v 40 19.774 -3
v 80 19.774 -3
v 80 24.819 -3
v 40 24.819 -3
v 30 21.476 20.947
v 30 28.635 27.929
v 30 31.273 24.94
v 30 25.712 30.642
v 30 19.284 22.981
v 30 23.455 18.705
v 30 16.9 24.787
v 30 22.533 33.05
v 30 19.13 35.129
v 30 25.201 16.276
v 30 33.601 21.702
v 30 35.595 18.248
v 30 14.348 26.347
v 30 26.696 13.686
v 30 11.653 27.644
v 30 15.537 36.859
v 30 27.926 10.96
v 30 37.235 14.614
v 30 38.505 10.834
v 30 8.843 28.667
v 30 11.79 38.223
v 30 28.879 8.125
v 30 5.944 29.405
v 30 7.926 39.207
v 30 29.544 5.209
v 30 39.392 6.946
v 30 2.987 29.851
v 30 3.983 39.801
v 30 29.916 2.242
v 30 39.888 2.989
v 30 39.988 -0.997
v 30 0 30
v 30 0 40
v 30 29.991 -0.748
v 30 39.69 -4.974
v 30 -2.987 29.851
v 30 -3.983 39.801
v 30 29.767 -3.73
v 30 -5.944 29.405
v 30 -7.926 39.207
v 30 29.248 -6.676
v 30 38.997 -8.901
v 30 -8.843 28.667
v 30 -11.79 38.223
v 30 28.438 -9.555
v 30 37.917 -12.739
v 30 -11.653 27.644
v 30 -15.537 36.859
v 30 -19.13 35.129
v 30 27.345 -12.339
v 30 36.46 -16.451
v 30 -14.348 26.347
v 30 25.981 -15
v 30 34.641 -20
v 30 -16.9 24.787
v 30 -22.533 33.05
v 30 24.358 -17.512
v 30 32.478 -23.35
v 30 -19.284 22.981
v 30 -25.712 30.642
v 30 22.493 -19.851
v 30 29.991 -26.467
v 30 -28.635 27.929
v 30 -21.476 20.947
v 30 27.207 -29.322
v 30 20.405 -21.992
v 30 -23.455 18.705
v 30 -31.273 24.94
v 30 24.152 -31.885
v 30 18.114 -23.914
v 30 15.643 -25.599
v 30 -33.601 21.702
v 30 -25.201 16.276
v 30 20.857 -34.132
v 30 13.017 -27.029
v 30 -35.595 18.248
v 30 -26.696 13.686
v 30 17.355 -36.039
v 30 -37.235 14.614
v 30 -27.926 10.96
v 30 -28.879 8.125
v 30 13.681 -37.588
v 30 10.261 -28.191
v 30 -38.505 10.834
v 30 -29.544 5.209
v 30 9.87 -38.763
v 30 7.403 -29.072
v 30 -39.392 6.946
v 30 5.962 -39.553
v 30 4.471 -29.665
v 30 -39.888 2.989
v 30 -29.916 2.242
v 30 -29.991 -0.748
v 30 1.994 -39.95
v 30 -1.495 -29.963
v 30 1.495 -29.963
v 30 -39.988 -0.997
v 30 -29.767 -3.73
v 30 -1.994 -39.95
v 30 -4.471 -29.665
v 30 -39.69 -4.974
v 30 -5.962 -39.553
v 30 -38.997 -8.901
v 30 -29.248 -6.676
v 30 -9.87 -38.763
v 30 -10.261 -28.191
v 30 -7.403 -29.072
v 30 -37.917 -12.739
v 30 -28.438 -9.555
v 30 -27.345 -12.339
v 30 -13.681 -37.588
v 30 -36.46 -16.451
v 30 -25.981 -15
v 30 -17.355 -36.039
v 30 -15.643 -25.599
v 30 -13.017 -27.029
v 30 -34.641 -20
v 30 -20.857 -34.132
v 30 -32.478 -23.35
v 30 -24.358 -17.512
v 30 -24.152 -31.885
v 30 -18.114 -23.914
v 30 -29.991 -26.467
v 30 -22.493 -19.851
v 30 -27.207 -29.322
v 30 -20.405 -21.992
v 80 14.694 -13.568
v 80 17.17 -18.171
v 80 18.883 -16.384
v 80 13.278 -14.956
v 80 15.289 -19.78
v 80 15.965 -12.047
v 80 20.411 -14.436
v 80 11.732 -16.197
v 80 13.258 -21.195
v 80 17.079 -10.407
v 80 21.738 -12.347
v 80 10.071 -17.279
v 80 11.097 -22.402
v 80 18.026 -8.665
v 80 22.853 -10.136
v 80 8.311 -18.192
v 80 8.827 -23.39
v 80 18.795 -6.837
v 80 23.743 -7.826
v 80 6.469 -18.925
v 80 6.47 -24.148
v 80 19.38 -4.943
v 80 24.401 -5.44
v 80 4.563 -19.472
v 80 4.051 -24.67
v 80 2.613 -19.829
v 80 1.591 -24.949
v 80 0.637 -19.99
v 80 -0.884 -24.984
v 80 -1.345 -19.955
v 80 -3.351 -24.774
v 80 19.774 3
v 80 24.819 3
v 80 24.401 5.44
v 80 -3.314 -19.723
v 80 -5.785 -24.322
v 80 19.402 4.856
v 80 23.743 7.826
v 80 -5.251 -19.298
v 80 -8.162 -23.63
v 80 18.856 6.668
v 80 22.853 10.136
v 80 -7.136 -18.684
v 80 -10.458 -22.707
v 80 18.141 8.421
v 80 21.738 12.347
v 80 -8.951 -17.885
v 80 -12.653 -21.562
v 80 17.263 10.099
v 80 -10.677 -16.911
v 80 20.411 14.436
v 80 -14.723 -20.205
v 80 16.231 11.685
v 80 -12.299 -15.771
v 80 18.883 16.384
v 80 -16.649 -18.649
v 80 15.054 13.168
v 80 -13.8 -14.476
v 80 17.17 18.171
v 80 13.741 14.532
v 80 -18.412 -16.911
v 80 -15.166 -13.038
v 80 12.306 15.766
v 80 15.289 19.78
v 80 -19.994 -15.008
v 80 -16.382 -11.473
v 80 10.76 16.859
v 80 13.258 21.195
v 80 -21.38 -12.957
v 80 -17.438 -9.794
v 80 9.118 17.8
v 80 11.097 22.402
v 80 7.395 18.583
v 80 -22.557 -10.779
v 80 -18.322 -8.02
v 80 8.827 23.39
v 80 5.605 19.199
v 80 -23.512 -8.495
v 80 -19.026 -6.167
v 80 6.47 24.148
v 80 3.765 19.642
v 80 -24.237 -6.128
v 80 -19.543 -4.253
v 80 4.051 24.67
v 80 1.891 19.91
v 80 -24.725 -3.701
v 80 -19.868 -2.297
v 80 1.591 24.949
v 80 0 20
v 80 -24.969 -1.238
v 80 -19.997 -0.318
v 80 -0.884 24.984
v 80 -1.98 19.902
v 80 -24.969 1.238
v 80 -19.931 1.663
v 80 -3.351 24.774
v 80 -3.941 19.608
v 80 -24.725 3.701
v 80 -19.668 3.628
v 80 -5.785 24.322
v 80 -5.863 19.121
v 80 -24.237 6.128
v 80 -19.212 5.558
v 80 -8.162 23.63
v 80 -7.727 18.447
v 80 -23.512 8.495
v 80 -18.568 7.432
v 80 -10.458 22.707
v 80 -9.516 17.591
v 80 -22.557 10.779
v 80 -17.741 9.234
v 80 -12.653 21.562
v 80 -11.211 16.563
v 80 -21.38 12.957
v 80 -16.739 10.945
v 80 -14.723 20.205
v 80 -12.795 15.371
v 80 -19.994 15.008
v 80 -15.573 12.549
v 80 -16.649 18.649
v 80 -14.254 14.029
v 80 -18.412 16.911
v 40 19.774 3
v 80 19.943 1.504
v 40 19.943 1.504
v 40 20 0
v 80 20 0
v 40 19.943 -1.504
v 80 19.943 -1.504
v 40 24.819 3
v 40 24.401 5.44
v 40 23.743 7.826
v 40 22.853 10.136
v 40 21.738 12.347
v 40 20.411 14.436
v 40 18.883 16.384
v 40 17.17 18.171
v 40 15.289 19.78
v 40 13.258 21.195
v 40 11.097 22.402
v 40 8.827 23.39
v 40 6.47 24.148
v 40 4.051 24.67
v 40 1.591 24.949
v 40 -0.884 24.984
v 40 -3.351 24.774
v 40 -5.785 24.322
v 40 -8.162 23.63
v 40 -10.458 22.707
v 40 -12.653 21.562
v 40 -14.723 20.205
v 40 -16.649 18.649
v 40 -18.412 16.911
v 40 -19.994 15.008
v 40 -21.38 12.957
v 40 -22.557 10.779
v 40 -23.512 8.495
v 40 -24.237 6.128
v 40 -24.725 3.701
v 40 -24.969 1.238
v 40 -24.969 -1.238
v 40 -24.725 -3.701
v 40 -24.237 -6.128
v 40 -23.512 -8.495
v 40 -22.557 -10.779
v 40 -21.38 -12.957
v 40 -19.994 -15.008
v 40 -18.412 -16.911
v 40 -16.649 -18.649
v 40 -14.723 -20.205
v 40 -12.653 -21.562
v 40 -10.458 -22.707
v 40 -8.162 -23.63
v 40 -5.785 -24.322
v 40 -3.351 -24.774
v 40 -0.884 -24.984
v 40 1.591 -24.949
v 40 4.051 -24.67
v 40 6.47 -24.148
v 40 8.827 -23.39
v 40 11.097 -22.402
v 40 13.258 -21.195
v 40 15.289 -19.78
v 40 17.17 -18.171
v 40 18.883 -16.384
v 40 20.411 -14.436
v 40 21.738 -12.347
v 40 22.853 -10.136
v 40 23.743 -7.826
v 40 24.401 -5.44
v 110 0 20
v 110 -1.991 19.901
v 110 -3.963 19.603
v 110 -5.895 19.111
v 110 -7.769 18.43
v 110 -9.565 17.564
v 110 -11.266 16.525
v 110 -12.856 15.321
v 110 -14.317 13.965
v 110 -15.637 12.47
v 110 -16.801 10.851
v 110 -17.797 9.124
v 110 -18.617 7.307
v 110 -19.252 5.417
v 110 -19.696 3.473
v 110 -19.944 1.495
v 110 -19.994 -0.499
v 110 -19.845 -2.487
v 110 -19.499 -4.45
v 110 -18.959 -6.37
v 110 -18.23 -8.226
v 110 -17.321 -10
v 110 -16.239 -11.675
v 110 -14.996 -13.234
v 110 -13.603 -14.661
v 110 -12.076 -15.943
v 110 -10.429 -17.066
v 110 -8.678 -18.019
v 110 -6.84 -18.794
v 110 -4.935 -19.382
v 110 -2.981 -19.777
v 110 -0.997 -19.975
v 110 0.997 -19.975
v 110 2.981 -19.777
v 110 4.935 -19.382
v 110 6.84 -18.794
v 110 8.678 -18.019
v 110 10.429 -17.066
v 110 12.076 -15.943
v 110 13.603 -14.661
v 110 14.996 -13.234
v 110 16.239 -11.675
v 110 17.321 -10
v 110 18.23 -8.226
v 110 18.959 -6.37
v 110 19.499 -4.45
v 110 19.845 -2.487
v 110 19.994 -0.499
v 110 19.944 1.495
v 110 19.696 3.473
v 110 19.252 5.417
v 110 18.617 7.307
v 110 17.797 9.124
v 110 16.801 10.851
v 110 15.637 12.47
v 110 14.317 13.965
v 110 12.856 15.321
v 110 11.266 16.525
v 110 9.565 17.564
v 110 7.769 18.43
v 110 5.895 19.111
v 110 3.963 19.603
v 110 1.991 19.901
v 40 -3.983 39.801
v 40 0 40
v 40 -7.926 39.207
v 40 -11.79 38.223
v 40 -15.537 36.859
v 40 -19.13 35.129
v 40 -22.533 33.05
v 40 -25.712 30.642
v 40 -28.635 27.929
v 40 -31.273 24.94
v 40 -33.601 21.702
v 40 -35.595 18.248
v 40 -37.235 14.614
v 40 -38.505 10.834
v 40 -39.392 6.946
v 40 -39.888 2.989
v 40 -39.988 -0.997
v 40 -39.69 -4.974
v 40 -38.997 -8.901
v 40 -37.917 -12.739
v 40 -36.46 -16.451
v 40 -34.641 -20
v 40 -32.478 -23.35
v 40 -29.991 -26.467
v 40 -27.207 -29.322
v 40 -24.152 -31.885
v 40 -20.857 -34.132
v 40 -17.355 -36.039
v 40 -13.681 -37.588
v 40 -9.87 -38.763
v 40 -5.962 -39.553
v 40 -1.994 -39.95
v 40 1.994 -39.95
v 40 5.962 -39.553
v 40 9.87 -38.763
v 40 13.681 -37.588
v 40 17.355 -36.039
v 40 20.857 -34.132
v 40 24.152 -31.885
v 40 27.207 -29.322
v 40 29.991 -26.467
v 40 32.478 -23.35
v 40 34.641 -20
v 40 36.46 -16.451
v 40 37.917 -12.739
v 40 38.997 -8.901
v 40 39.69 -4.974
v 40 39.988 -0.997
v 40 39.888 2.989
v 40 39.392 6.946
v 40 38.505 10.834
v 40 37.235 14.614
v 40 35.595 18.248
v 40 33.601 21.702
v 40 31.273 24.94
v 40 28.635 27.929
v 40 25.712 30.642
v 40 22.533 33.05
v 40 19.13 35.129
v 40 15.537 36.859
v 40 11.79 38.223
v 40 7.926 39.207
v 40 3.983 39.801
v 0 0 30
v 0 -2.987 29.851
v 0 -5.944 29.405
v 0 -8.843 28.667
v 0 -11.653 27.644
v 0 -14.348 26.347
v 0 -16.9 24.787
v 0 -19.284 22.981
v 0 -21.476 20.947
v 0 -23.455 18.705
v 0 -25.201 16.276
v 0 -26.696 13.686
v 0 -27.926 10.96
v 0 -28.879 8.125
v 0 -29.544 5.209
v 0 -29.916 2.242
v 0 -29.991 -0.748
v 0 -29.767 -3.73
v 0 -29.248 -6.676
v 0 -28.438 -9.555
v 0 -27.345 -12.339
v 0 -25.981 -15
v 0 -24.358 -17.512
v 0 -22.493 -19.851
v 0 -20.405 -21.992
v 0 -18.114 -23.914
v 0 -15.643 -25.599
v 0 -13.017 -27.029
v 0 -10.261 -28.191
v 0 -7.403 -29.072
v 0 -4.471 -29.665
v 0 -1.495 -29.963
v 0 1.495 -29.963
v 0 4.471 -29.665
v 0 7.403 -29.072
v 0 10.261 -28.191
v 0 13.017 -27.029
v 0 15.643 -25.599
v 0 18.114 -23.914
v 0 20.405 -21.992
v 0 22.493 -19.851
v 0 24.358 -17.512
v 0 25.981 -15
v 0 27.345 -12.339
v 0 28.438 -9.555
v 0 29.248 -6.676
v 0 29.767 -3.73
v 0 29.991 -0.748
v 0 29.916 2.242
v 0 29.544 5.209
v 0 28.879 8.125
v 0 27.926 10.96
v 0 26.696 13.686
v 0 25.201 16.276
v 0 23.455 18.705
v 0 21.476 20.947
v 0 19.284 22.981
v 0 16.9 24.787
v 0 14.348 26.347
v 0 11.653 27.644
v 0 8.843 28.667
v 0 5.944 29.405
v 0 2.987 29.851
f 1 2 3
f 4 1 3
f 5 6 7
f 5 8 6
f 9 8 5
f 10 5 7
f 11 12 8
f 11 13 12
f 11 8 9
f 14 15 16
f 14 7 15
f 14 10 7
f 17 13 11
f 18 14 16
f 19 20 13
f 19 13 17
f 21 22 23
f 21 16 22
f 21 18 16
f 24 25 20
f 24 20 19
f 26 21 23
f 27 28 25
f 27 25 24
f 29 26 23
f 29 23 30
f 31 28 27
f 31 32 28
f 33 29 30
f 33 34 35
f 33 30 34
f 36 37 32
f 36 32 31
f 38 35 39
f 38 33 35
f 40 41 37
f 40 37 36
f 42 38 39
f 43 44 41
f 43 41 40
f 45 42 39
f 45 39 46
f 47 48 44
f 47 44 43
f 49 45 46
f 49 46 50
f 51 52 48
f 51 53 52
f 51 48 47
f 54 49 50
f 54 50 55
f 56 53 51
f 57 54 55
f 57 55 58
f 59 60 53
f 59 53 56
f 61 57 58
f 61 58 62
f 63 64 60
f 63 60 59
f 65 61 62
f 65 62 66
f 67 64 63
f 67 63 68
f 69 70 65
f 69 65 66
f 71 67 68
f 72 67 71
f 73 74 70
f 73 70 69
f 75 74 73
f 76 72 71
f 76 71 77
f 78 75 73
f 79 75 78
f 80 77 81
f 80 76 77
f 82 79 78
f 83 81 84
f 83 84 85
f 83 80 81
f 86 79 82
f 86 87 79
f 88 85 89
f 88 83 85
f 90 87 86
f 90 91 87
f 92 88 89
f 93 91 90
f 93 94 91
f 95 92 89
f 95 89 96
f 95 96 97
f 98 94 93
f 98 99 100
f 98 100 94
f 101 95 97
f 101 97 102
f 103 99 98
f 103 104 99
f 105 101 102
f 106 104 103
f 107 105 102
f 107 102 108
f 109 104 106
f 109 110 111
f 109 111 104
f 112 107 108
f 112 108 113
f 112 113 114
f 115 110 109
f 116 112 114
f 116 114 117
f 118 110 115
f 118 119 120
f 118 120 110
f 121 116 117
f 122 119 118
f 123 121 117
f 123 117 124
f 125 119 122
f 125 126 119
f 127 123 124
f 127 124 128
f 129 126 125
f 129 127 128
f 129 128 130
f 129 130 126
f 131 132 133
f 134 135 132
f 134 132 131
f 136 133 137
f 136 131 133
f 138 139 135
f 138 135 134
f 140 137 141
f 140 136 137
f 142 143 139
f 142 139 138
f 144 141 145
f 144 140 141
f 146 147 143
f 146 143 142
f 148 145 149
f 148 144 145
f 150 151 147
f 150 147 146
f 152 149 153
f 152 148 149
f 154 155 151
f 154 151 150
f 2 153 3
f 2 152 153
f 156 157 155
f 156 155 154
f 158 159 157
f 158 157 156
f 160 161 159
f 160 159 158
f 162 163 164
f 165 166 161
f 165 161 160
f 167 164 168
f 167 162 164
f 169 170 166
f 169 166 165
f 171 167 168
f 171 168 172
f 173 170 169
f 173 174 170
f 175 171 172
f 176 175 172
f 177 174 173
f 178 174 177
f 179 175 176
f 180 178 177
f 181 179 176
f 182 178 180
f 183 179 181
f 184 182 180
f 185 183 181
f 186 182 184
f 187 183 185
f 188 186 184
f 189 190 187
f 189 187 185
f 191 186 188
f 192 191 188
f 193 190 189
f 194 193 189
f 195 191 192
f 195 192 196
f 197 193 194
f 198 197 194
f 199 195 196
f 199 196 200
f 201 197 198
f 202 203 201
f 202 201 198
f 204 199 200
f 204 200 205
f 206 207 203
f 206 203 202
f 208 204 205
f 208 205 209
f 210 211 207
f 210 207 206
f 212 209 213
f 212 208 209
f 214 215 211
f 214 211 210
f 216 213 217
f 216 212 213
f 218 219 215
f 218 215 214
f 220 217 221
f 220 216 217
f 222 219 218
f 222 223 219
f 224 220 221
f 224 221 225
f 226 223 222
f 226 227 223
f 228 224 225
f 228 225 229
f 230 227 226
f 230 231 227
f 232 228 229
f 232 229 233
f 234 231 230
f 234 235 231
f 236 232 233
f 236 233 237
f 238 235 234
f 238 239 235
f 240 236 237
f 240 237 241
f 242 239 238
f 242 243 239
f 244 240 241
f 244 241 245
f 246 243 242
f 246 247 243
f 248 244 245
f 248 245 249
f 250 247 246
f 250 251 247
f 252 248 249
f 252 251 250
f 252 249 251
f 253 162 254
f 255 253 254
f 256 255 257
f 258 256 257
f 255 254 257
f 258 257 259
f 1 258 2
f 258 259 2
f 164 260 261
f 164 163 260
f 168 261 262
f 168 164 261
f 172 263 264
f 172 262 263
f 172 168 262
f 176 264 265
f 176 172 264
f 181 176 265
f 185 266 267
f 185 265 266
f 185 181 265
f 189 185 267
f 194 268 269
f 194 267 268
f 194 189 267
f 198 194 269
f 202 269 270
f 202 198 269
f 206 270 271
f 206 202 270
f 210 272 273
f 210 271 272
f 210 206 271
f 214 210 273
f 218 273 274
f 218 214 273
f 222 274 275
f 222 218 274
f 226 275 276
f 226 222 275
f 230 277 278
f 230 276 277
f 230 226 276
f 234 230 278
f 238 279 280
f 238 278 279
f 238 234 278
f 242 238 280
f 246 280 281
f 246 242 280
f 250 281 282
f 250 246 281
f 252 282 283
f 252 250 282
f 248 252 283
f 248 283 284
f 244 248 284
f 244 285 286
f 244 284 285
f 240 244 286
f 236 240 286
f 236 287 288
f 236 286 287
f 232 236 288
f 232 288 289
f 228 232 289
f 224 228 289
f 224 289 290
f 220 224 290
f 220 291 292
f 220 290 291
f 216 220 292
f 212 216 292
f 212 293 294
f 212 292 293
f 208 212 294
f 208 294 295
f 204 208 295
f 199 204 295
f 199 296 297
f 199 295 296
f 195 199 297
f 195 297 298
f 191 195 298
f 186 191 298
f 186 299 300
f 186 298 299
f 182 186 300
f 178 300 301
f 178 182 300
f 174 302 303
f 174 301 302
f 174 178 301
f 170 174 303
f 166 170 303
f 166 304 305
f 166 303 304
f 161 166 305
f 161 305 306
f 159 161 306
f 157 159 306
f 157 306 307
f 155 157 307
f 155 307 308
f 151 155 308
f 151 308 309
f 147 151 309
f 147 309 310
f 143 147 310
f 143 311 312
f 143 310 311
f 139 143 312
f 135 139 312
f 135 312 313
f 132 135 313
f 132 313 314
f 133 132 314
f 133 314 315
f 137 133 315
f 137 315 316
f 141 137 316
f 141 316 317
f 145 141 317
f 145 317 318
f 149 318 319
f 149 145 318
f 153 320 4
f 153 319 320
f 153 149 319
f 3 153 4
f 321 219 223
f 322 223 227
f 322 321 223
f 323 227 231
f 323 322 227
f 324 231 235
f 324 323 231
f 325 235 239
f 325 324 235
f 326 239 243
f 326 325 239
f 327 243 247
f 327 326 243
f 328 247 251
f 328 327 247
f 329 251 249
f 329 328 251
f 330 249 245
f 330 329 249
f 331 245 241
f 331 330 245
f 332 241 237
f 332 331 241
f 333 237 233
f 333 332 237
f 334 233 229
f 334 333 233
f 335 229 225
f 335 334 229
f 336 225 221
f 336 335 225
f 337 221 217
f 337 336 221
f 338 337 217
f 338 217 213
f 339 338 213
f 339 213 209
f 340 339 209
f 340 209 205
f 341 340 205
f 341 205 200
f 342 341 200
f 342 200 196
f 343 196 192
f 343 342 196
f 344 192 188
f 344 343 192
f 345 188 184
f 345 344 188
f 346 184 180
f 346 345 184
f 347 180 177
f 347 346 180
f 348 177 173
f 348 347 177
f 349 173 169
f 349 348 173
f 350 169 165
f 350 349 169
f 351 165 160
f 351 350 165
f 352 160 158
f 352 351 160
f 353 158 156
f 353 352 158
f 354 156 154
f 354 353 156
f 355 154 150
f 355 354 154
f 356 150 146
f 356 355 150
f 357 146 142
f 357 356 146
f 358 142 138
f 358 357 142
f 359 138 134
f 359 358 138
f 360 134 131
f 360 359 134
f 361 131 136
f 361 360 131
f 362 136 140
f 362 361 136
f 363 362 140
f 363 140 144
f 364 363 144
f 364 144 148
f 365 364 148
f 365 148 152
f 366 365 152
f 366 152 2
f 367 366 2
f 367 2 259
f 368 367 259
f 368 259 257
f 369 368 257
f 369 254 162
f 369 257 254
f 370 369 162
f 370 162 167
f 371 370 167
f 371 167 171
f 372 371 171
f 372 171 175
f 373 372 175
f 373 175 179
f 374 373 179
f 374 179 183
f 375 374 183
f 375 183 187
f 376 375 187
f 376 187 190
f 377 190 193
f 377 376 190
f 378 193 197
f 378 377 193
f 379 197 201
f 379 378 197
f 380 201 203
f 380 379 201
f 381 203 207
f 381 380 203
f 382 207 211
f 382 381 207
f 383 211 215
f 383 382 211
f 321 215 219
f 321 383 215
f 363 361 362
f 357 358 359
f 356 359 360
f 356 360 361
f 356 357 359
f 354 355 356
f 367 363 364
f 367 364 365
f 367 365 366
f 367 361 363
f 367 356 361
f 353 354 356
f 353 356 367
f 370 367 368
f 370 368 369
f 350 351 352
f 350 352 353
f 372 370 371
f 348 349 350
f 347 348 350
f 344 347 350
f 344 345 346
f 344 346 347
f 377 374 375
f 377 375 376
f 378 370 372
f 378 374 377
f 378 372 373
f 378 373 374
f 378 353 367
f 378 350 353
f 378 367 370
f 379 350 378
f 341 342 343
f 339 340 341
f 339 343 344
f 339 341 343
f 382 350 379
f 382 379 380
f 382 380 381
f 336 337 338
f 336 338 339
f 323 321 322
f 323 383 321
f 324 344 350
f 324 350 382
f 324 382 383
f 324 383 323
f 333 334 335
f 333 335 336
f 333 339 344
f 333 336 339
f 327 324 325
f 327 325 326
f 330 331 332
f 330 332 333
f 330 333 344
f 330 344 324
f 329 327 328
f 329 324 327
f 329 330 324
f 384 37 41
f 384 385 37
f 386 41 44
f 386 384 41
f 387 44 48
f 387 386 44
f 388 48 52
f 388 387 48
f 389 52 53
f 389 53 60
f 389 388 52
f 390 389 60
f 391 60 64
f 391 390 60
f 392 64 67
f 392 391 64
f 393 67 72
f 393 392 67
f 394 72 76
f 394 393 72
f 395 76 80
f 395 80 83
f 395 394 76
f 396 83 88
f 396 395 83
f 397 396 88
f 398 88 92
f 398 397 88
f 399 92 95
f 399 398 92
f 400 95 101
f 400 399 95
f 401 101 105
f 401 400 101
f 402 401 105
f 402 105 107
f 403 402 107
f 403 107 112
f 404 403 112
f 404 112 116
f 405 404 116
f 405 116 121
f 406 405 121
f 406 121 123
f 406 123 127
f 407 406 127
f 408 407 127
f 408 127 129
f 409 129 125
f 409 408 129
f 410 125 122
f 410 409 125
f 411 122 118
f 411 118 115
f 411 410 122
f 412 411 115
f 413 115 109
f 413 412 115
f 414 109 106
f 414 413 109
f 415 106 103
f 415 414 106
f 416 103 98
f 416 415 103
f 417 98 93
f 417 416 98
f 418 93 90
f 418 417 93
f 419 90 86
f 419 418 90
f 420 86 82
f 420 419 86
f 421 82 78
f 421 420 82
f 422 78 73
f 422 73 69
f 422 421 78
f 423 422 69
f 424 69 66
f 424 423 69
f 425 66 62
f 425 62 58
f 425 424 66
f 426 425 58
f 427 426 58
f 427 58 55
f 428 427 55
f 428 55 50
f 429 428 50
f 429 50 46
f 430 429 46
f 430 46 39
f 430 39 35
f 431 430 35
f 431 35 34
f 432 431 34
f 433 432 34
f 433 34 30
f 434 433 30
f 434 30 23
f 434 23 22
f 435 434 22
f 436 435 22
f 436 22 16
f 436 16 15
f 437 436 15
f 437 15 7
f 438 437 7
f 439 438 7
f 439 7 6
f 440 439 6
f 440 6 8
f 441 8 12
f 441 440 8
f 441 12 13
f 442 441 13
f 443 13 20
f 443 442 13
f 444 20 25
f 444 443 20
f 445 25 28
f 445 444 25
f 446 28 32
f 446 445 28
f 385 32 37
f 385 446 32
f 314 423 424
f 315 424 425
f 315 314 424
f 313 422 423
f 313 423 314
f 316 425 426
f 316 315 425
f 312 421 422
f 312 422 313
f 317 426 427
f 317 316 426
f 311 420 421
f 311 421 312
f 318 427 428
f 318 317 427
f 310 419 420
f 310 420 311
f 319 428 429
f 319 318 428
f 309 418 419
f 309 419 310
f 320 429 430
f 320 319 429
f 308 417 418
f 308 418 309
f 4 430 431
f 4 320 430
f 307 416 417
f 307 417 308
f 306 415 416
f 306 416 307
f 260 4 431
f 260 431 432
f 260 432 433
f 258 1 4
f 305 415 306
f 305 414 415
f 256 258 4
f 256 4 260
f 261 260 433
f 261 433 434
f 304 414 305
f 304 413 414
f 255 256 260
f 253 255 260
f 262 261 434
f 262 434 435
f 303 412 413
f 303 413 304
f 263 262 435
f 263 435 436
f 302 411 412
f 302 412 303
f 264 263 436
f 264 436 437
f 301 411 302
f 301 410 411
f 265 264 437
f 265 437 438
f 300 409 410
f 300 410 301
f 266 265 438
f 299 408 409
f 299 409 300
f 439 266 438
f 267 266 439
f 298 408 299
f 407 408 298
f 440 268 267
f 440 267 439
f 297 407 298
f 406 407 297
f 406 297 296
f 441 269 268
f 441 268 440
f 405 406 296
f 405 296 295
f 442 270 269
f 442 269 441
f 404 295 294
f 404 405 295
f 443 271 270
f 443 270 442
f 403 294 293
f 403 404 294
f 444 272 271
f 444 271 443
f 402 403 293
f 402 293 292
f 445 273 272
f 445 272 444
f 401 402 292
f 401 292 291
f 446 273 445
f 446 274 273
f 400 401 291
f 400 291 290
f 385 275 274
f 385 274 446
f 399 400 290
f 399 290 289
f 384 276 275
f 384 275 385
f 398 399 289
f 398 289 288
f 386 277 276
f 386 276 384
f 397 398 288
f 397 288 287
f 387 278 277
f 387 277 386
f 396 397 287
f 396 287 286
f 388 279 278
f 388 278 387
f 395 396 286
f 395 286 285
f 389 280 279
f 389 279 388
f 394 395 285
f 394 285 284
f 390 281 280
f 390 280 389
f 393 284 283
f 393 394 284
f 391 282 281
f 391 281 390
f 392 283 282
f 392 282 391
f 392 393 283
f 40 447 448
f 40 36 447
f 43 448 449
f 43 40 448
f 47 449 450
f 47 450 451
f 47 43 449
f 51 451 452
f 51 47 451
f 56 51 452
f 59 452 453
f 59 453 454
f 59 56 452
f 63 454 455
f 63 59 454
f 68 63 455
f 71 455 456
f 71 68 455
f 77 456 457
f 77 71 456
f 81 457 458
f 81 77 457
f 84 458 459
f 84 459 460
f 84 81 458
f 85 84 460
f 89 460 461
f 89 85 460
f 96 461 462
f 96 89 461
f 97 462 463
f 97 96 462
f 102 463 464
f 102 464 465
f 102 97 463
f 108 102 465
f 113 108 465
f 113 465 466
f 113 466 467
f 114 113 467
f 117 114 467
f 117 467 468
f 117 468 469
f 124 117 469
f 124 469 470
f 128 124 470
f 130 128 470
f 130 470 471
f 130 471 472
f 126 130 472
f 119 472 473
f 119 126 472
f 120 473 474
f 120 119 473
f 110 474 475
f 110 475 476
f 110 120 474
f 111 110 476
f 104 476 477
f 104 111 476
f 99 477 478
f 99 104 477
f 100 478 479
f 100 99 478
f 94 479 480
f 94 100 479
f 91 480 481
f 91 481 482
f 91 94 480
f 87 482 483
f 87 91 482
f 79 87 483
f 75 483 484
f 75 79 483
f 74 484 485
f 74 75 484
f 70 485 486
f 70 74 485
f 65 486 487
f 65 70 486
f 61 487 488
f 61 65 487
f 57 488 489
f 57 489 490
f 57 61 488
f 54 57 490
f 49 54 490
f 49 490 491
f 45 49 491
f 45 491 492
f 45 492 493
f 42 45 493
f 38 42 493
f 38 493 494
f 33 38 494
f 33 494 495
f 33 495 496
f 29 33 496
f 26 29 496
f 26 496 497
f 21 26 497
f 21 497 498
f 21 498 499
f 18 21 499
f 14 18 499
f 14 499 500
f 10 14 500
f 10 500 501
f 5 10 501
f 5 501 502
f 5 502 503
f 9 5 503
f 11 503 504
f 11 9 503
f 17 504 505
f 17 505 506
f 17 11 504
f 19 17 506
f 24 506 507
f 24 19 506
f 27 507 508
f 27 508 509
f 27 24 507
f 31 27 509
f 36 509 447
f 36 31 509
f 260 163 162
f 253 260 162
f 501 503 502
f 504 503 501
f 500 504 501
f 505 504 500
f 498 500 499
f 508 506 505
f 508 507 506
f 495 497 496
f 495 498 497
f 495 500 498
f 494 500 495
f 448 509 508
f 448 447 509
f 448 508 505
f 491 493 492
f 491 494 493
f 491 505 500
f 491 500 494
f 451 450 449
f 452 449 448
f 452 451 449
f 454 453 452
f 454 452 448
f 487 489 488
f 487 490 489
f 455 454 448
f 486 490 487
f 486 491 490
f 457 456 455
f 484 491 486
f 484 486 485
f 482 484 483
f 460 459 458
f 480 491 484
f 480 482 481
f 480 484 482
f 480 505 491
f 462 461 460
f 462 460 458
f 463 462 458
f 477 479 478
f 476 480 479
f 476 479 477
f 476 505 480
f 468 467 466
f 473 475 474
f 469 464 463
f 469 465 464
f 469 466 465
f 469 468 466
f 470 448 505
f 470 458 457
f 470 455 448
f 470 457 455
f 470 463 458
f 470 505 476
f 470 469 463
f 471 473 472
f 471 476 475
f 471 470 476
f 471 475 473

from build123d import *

# Parameters (mm, degrees)
CUT_EXTRUDE1_DEPTH = 40


with BuildPart() as part:
    # Sketch1 → Revolve2 (revolve)
    with BuildSketch(Plane.XY, mode=Mode.PRIVATE) as revolve2_sk:
        Polygon((30, 30), (30, 40), (40, 40), (40, 25), (80, 25), (80, 20), (110, 20), (110, 0), (51.715920118, 0), (0, 0), (0, 30), align=None)
    revolve(revolve2_sk.sketch.rotate(Axis((-14.684767441, 0, 0), (1, 0, 0)), 90), axis=Axis((-14.684767441, 0, 0), (1, 0, 0)))

    # Sketch2 → Cut-Extrude1 (cut)
    with BuildSketch(Plane(origin=(80, 0, 0), x_dir=(0, 0, -1), z_dir=(1, 0, 0))):
        with BuildLine():
            Line((-3, 24.819347292), (-3, 19.773719933))
            ThreePointArc((-3, 19.773719933), (0, 20), (3, 19.773719933))
            Line((3, 19.773719933), (3, 24.819347292))
            ThreePointArc((3, 24.819347292), (0, 25), (-3, 24.819347292))
        make_face()
    extrude(amount=-CUT_EXTRUDE1_DEPTH, mode=Mode.SUBTRACT)


solid = part.part
